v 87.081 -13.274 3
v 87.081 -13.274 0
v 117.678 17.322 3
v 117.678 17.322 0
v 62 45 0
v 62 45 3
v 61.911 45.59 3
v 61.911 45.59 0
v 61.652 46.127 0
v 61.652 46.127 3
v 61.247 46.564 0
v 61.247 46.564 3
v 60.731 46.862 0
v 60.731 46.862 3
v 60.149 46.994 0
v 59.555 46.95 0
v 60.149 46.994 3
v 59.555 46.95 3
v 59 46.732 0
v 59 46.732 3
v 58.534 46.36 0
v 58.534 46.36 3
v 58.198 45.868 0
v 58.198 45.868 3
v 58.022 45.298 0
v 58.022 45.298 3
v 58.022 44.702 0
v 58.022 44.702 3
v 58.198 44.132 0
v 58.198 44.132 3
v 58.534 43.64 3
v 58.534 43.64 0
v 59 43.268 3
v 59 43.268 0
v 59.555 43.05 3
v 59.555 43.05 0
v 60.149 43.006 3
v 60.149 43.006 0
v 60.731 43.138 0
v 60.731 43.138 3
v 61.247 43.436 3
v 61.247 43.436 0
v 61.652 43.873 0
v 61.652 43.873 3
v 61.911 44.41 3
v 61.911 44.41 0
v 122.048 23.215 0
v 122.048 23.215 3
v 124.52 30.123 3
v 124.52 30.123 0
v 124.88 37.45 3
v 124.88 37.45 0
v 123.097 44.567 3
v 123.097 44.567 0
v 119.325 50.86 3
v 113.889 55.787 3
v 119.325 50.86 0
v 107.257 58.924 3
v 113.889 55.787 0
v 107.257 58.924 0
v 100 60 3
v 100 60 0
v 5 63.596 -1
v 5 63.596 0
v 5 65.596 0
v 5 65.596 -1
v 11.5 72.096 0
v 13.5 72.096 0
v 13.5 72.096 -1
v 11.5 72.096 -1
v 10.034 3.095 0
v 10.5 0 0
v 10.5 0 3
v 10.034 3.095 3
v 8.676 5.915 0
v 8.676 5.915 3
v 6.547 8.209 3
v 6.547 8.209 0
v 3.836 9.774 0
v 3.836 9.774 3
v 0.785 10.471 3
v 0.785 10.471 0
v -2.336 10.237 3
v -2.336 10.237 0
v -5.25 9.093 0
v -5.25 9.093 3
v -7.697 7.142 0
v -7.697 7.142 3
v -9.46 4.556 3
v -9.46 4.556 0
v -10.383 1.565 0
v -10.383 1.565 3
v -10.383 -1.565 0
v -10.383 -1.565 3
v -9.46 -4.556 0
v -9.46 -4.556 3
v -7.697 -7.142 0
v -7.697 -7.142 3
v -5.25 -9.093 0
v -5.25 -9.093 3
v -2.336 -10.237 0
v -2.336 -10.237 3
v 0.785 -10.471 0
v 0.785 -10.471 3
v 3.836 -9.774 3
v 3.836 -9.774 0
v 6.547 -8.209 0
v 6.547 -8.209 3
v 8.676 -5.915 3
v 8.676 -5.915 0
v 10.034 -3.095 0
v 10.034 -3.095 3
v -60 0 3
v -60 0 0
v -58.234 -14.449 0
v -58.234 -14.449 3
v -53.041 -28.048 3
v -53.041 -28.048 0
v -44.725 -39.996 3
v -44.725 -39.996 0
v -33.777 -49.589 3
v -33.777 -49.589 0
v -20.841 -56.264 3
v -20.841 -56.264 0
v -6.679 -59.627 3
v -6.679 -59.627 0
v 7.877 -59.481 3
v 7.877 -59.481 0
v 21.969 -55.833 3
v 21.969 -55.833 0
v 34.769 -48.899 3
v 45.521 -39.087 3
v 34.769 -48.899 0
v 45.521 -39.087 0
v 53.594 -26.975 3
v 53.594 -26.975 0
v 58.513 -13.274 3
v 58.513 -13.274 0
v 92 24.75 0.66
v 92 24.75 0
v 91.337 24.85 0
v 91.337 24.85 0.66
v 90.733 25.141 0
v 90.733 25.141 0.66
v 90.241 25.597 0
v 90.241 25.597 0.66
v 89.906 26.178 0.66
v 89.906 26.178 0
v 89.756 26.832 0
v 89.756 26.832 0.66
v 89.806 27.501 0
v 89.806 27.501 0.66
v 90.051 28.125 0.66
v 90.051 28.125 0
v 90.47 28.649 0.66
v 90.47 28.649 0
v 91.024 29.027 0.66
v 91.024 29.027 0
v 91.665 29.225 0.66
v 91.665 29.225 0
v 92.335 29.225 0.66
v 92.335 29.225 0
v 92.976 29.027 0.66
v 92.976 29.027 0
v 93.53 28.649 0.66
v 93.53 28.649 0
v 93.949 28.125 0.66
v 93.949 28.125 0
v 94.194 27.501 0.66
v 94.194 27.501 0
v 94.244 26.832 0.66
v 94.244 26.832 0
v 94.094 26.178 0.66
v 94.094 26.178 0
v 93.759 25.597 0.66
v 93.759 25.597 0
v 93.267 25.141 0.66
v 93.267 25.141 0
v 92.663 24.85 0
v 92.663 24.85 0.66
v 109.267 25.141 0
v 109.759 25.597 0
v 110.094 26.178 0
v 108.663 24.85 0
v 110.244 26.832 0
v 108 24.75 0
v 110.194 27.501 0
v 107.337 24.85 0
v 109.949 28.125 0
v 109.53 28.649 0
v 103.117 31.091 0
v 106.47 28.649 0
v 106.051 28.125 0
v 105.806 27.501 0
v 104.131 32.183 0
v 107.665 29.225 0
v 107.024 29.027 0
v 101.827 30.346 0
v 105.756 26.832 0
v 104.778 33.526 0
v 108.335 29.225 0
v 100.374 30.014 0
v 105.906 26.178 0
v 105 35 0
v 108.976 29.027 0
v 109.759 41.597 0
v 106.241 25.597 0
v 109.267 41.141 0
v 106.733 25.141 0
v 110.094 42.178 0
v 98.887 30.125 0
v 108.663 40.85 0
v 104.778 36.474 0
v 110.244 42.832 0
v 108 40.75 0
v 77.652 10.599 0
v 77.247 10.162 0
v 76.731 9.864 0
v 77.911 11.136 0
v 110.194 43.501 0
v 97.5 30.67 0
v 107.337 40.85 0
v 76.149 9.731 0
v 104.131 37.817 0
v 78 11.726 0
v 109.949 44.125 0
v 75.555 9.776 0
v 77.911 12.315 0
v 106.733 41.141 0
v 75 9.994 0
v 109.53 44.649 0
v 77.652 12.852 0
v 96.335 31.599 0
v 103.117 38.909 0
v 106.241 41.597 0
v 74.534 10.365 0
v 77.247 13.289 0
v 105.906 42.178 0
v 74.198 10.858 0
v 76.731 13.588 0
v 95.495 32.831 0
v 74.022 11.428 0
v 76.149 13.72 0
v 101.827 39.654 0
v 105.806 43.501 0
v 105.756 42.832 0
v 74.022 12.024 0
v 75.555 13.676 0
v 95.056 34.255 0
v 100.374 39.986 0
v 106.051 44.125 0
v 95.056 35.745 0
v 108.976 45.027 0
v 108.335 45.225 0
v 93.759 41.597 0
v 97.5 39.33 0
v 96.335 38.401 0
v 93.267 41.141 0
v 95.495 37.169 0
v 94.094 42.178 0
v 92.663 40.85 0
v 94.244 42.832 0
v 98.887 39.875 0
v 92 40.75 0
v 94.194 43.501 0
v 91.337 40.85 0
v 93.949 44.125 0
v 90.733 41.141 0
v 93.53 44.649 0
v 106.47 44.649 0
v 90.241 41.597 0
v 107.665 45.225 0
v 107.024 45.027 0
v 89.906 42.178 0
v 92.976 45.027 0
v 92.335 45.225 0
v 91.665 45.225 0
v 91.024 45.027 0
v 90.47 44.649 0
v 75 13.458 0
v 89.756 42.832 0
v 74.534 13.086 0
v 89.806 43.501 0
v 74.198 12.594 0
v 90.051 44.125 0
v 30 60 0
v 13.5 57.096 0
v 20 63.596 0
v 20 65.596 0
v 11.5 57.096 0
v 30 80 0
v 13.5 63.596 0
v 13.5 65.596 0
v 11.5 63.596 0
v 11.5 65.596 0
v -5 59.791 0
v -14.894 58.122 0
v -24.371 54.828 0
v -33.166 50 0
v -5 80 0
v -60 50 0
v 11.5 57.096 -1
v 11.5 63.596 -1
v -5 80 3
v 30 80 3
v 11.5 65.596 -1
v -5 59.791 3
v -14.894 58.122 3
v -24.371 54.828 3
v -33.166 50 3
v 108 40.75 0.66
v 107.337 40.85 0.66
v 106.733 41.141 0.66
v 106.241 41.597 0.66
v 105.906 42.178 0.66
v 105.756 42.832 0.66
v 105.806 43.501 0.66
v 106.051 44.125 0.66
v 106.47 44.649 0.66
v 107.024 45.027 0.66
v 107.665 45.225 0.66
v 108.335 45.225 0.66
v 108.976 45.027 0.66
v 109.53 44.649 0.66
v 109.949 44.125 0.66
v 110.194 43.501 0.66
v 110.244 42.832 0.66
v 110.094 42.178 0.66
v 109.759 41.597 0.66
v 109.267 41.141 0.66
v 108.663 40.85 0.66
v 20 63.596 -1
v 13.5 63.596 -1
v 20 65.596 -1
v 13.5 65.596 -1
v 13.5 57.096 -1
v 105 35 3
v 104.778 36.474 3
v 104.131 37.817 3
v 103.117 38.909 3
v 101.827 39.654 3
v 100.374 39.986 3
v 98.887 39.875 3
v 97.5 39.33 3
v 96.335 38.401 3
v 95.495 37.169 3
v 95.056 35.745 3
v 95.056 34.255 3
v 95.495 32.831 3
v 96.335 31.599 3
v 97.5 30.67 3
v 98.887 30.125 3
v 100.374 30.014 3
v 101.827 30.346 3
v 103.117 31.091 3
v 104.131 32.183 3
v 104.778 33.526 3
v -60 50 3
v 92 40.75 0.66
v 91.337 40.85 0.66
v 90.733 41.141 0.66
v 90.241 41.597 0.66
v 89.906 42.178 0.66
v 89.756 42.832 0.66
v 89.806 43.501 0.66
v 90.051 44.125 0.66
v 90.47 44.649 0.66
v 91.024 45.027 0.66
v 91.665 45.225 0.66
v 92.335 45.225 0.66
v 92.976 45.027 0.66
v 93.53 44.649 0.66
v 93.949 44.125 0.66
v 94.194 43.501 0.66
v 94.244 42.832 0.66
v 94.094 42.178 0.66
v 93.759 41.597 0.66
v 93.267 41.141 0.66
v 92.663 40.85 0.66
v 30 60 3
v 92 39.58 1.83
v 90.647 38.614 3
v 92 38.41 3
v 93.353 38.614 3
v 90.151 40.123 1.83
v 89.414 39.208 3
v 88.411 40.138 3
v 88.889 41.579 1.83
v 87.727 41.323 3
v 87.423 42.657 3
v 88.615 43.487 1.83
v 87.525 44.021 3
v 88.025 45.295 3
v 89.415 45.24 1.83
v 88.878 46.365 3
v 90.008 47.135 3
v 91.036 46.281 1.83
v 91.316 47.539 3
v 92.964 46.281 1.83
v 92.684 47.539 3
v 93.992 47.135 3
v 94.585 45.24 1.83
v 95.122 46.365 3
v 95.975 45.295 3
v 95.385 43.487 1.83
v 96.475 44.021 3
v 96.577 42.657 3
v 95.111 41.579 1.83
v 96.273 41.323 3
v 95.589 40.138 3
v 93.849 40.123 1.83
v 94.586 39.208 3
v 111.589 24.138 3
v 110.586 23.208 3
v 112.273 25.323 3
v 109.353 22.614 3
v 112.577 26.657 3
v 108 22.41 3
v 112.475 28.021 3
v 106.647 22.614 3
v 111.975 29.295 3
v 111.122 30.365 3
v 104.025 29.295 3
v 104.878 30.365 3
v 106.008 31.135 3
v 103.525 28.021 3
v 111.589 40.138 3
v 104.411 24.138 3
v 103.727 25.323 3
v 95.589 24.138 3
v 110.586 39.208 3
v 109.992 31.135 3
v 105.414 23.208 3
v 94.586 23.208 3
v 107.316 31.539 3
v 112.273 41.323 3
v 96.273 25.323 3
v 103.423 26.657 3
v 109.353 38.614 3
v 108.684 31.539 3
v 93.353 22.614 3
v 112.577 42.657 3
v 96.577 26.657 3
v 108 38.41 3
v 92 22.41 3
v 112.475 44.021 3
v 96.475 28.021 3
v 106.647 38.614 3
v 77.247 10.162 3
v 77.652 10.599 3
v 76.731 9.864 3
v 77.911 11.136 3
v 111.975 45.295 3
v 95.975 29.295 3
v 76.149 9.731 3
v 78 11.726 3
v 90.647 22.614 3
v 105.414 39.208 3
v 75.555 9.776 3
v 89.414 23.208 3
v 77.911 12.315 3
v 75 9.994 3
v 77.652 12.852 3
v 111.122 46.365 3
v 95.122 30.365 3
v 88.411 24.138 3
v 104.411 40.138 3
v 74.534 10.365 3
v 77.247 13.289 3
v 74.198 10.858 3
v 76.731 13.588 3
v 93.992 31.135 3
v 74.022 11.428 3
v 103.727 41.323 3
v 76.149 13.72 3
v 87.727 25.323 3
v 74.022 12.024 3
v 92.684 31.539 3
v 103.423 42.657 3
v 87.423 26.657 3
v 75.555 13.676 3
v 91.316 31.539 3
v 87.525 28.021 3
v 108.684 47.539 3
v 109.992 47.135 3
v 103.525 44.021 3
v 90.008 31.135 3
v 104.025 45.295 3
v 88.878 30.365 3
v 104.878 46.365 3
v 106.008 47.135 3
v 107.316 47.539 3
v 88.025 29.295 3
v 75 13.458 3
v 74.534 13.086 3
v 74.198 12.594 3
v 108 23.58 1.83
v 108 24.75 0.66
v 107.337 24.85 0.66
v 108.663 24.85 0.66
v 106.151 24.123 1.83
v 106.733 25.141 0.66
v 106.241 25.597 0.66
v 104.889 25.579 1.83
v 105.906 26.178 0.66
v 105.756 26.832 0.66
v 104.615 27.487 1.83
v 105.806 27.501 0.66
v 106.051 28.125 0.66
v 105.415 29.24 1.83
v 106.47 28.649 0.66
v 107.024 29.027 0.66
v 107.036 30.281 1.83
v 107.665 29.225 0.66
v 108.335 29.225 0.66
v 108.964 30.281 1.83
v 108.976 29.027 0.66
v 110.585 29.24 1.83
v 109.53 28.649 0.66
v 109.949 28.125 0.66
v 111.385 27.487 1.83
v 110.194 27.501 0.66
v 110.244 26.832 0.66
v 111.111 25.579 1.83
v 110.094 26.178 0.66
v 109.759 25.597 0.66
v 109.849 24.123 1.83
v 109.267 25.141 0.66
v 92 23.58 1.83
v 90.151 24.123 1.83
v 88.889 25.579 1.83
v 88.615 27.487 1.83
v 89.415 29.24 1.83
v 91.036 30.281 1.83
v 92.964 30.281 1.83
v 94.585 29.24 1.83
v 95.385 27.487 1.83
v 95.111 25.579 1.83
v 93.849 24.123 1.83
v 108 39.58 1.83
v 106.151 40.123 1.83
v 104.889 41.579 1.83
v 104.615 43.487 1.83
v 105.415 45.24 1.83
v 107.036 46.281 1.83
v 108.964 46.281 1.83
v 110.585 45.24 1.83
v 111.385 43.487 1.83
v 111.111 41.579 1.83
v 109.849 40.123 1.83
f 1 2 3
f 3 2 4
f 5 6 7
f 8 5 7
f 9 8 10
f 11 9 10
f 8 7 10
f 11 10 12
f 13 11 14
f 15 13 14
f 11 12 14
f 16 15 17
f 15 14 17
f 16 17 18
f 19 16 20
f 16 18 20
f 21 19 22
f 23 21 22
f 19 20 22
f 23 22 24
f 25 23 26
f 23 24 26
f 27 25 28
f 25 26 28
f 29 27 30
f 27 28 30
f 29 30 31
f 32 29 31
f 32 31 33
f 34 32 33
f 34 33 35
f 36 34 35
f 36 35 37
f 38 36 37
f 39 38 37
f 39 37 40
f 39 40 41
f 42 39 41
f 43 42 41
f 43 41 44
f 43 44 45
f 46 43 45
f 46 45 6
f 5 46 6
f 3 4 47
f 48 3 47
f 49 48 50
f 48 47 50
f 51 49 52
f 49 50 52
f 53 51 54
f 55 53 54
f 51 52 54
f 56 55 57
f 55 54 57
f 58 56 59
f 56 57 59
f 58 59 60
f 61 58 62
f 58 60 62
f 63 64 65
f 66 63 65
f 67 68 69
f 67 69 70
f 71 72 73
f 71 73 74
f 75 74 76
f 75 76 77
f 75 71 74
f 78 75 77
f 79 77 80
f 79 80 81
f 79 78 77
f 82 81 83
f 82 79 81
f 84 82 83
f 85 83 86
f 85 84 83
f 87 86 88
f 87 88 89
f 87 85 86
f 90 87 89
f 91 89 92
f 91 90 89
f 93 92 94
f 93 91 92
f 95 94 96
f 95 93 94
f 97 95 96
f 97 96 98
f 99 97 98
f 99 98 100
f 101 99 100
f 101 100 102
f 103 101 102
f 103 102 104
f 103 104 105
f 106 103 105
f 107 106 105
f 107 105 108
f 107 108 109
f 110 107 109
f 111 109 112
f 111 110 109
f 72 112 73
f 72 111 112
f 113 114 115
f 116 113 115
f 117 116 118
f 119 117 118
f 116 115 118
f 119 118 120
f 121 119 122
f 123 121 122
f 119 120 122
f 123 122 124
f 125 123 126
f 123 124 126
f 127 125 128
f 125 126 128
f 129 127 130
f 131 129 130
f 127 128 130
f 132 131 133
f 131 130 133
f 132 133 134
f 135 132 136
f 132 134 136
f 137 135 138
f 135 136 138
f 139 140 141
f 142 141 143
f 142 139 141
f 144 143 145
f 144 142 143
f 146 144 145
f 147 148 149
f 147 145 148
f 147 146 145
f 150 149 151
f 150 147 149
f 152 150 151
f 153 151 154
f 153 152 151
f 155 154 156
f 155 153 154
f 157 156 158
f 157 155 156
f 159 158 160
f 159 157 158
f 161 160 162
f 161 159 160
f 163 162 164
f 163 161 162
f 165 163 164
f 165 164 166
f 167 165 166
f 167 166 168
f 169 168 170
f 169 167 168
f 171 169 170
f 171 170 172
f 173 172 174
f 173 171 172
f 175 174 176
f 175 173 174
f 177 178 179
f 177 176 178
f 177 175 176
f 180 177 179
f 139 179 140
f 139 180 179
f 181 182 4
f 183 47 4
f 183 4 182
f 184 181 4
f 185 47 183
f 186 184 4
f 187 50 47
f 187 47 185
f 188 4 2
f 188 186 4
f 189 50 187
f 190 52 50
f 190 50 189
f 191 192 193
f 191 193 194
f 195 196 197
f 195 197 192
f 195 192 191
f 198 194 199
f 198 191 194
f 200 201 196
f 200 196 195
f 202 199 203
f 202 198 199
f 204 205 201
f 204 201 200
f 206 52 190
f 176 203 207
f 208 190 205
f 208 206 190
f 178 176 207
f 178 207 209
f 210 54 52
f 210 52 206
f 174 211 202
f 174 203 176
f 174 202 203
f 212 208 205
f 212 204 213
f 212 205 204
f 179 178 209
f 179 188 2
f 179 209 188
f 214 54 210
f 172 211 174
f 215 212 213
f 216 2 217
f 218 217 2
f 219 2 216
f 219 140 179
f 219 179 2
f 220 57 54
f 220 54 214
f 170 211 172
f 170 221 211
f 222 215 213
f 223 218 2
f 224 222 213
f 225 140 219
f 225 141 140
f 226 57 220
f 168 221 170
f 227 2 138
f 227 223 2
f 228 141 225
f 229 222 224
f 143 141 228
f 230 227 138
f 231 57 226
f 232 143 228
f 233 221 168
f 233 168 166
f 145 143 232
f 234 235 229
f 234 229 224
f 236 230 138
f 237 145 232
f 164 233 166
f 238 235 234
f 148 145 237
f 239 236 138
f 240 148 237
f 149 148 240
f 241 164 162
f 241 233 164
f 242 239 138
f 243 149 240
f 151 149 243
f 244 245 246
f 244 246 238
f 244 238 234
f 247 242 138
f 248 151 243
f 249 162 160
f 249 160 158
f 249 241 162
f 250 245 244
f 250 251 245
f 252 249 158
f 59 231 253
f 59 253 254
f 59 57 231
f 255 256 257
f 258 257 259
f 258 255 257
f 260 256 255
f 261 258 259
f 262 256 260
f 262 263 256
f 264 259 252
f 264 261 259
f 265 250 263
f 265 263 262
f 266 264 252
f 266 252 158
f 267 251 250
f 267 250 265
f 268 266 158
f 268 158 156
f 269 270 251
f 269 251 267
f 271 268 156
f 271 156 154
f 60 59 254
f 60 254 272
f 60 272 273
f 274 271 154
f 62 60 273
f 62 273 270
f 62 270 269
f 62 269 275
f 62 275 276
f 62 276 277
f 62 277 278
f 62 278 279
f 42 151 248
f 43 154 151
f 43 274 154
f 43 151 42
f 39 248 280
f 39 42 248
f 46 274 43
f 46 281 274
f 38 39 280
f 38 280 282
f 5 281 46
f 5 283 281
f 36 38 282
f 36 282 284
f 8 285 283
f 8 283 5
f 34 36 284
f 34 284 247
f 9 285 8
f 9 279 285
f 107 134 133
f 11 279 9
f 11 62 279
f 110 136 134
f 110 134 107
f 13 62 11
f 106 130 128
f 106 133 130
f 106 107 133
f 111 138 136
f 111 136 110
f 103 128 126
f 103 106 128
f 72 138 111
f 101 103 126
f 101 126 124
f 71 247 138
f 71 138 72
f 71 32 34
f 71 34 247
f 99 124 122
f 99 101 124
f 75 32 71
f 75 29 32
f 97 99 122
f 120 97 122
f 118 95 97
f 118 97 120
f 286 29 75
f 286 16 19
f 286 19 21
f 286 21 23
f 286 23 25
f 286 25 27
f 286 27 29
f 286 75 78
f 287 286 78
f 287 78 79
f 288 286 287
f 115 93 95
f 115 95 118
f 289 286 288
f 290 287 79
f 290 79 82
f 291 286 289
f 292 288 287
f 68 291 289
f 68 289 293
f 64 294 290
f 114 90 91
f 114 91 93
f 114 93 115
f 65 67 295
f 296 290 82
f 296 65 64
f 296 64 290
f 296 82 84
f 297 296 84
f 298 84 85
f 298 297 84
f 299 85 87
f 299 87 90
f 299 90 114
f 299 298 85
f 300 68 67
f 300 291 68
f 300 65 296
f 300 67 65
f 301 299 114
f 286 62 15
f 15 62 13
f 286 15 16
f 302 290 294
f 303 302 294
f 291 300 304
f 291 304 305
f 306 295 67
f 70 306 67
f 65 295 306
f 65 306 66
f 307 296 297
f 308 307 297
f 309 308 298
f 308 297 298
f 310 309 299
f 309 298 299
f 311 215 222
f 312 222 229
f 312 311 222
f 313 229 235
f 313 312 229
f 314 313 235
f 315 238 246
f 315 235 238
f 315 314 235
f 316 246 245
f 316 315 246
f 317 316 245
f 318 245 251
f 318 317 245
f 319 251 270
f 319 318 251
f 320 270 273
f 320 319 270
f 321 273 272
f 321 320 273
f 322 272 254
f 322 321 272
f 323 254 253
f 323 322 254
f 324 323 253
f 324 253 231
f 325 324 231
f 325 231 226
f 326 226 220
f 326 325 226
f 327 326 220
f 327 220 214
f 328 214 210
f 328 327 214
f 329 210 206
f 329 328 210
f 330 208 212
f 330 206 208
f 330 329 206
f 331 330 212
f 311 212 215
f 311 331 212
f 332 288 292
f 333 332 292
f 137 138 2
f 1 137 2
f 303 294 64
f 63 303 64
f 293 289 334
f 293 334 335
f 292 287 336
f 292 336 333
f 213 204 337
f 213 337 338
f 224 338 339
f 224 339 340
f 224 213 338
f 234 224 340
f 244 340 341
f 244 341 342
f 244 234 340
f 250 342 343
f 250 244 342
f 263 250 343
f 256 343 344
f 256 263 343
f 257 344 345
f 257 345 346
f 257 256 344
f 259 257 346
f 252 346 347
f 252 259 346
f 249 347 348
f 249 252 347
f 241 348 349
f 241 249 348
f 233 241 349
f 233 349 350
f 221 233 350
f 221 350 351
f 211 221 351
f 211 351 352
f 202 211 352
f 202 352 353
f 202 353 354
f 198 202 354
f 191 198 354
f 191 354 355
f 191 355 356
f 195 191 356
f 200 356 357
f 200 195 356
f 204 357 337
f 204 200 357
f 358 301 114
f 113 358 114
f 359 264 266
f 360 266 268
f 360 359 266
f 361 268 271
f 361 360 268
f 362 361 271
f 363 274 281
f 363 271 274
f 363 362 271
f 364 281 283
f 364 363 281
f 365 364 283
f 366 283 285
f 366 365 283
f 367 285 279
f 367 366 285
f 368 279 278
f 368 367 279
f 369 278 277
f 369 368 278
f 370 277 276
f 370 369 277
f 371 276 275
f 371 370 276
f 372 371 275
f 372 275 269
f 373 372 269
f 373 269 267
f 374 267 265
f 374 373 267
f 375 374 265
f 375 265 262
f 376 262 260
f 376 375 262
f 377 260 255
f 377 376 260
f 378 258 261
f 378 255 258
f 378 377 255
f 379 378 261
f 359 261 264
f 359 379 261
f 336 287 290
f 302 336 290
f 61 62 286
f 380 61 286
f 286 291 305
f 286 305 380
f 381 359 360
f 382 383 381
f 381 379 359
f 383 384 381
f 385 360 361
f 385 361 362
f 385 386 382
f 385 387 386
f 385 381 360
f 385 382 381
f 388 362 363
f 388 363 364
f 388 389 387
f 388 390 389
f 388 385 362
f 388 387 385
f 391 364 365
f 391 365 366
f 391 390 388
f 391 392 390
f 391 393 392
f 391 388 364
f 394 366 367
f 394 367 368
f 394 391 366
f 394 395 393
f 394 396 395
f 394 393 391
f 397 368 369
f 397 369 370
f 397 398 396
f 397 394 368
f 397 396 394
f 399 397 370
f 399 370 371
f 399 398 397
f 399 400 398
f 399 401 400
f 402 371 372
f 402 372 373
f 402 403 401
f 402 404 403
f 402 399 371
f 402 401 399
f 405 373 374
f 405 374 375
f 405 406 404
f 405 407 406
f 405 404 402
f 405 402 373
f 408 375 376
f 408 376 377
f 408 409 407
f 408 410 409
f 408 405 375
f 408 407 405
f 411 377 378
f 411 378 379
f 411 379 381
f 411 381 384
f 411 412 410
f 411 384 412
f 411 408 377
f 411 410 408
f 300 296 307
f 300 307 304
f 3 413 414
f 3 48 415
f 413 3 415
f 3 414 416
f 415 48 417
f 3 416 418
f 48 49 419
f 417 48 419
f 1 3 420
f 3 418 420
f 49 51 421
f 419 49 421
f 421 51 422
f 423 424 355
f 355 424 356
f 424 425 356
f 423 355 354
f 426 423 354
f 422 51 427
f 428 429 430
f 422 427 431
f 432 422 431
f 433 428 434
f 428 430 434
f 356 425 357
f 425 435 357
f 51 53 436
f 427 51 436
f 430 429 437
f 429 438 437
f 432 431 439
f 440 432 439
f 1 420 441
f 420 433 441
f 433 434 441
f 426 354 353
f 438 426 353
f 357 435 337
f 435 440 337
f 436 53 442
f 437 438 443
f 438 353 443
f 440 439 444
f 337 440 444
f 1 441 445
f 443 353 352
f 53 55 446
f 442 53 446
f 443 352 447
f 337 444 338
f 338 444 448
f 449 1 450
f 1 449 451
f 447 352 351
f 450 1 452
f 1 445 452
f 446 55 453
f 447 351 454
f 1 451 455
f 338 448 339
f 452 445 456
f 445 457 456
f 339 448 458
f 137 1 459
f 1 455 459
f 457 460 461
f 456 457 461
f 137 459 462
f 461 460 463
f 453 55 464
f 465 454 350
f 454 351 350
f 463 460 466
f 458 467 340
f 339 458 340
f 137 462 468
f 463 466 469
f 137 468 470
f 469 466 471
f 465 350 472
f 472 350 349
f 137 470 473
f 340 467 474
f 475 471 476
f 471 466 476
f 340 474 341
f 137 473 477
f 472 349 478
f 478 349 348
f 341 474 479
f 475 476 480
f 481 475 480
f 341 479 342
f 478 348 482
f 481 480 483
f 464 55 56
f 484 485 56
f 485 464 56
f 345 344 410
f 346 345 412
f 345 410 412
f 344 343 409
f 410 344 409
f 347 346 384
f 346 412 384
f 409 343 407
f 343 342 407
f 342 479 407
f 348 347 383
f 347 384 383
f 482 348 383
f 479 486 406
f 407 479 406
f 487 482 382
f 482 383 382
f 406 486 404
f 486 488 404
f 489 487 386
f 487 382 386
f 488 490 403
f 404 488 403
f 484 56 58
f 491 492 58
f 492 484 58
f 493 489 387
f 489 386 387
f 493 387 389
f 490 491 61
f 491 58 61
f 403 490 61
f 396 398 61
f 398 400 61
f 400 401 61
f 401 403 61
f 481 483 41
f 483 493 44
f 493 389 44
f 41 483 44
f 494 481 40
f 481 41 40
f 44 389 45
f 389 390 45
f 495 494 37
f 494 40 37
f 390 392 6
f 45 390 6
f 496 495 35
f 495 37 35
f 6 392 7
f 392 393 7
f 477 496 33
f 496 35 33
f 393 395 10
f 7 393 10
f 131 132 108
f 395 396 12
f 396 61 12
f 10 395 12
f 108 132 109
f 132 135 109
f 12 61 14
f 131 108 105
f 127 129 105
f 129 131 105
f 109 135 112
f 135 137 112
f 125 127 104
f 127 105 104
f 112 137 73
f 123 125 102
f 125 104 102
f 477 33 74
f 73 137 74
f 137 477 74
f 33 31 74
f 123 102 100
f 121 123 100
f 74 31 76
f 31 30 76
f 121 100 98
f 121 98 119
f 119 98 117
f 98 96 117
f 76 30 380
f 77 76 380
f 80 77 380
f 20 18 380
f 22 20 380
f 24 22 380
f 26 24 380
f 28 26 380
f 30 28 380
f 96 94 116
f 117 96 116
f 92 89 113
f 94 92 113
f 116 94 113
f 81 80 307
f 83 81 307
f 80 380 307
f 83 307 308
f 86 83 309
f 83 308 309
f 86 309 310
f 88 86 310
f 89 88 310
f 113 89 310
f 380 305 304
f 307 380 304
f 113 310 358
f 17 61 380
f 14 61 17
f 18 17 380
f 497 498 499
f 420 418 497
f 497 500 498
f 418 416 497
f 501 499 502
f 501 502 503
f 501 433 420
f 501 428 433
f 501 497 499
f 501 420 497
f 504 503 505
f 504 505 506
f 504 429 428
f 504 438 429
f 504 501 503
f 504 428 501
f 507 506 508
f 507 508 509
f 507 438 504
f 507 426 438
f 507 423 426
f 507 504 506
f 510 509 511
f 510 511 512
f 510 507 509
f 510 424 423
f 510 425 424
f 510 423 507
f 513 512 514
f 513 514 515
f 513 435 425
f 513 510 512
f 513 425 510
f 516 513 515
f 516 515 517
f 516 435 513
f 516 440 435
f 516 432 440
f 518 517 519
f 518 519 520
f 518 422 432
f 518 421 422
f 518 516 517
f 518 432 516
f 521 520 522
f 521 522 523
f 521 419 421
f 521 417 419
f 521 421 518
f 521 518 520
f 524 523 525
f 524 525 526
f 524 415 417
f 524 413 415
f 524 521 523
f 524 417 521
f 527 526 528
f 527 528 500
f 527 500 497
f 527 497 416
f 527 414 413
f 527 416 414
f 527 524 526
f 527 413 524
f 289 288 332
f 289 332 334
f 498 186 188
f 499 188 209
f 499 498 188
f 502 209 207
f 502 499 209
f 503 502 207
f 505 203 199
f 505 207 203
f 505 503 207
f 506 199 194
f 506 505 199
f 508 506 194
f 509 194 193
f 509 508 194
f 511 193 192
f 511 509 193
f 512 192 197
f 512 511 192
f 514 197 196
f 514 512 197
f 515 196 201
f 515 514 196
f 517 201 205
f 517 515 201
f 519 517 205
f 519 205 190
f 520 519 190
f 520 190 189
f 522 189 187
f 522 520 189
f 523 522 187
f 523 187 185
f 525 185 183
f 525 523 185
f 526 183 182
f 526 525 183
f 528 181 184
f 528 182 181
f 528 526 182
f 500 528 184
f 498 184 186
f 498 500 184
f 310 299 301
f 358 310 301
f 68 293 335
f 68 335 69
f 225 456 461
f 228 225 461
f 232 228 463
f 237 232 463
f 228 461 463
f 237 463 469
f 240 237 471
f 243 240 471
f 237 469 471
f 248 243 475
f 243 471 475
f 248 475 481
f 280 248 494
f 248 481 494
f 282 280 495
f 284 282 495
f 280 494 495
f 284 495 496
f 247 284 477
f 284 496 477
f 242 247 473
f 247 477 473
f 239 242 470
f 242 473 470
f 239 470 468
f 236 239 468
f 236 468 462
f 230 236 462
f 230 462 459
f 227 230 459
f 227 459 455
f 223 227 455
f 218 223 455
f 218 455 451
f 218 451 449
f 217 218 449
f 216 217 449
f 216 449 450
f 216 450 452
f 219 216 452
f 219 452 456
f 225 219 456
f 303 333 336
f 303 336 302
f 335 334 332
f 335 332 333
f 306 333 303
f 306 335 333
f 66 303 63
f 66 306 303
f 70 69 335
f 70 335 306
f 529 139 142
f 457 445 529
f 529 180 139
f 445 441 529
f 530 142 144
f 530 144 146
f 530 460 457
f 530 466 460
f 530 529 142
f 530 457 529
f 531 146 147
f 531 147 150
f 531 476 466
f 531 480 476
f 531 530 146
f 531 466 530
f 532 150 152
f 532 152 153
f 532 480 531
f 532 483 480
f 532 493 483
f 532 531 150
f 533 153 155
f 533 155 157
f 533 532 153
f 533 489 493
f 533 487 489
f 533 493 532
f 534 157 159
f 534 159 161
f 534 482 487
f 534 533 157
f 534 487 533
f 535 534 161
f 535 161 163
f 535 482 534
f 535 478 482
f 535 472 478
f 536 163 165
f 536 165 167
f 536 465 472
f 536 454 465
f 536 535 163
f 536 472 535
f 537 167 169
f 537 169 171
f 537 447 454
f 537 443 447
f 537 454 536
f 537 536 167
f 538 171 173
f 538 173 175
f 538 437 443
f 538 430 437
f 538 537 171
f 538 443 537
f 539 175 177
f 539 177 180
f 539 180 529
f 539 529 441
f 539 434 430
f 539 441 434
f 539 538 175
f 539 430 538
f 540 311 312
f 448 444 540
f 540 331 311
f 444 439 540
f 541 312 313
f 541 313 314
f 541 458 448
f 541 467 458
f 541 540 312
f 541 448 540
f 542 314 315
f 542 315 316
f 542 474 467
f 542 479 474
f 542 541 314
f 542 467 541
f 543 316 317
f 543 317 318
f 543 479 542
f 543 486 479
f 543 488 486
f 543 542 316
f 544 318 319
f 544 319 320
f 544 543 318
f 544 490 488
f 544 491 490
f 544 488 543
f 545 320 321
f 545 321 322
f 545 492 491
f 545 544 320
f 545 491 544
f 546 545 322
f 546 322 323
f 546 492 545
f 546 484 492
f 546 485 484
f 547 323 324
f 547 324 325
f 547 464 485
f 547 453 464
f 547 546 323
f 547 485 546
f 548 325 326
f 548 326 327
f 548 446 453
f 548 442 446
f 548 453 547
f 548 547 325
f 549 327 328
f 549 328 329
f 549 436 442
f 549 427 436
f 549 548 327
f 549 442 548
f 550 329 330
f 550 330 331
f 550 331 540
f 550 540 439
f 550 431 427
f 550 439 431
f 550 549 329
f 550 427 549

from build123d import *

# Parameters (mm, degrees)
SKETCH1_R                                    = 10.5
SKETCH1_R_2                                  = 5
BOSS_EXTRUDE1_DEPTH                          = 3
CUT_EXTRUDE1_REACH                           = 140.687
SKETCH2_R                                    = 2
BOSS_EXTRUDE2_DEPTH                          = 3
SKETCH4_W                                    = 2
SKETCH4_H                                    = 6.5
SKETCH4_W_2                                  = 6.5
SKETCH4_H_2                                  = 2
BOSS_EXTRUDE3_DEPTH                          = 1
SKETCH5_R                                    = 2
CUT_EXTRUDE2_DEPTH                           = 10
CSK_FOR_M4_HEX_SOCKET_COUNTERSUNK_HE_2_COUNT = 2
CSK_FOR_M4_HEX_SOCKET_COUNTERSUNK_HE_2_PITCH = 16
CSK_FOR_M4_HEX_SOCKET_COUNTERSUNK_HE_3_COUNT = 2
CSK_FOR_M4_HEX_SOCKET_COUNTERSUNK_HE_3_PITCH = 16
CSK_FOR_M4_HEX_SOCKET_COUNTERSUNK_HE_4_COUNT = 2
CSK_FOR_M4_HEX_SOCKET_COUNTERSUNK_HE_4_PITCH = 22.627416998


with BuildPart() as part:
    # Sketch1 → Boss-Extrude1 (new body)
    # profile 1 of 2: a face of its own
    with BuildSketch(Plane.XY):
        with BuildLine():
            ThreePointArc((-60, 0), (-52.867640737, 28.372743309), (-33.166247904, 50))
            Line((-33.166247904, 50), (-60, 50))
            Line((-60, 50), (-60, 0))
        make_face()
    # profile 2 of 2: a face of its own
    with BuildSketch(Plane.XY):
        with BuildLine():
            ThreePointArc((0, 60), (-17.320508076, 57.445626465), (-33.166247904, 50))
            ThreePointArc((-33.166247904, 50), (-52.867640737, 28.372743309), (-60, 0))
            ThreePointArc((-60, 0), (-6.678621673, -59.627141576), (58.513200418, -13.274237334))
            Line((58.513200418, -13.274237334), (87.081101726, -13.274237334))
            Line((87.081101726, -13.274237334), (117.67766953, 17.32233047))
            ThreePointArc((117.67766953, 17.32233047), (123.096988313, 44.567085809), (100, 60))
            Line((100, 60), (0, 60))
        make_face()
        Circle(SKETCH1_R, mode=Mode.SUBTRACT)
        with Locations((100, 35)):
            Circle(SKETCH1_R_2, mode=Mode.SUBTRACT)
    extrude(amount=BOSS_EXTRUDE1_DEPTH)

    # Sketch2 → Cut-Extrude1 (cut, up to next)
    with BuildSketch(Plane.XY.offset(3), mode=Mode.PRIVATE) as cut_extrude1_sk1:
        with Locations((60, 45)):
            Circle(SKETCH2_R)
    cut_extrude1_tool1 = extrude(cut_extrude1_sk1.sketch, amount=-CUT_EXTRUDE1_REACH, mode=Mode.PRIVATE) & part.part
    # Sketch2 → Cut-Extrude1 (cut, up to next)
    with BuildSketch(Plane.XY.offset(3), mode=Mode.PRIVATE) as cut_extrude1_sk2:
        with Locations((76, 11.725762666)):
            Circle(SKETCH2_R)
    cut_extrude1_tool2 = extrude(cut_extrude1_sk2.sketch, amount=-CUT_EXTRUDE1_REACH, mode=Mode.PRIVATE) & part.part
    add(cut_extrude1_tool1.solids().sort_by_distance((60, 45, 3))[0], mode=Mode.SUBTRACT)
    add(cut_extrude1_tool2.solids().sort_by_distance((76, 11.725763, 3))[0], mode=Mode.SUBTRACT)

    # Sketch3 → Boss-Extrude2 (add)
    with BuildSketch(Plane(origin=(0, 0, 0), x_dir=(-1, 0, 0), z_dir=(0, 0, -1))):
        with BuildLine():
            Line((-30, 80), (-30, 60))
            Line((-30, 60), (0, 60))
            ThreePointArc((0, 60), (2.502176759, 59.947803225), (5, 59.791303716))
            Line((5, 59.791303716), (5, 80))
            Line((5, 80), (-30, 80))
        make_face()
    extrude(amount=-BOSS_EXTRUDE2_DEPTH)

    # Sketch4 → Boss-Extrude3 (add)
    with BuildSketch(Plane(origin=(0, 0, 0), x_dir=(-1, 0, 0), z_dir=(0, 0, -1))):
        with Locations((-12.5, 68.846087829)):
            Rectangle(SKETCH4_W, SKETCH4_H)
        with Locations((-16.75, 64.596087829)):
            Rectangle(SKETCH4_W_2, SKETCH4_H_2)
        with Locations((-12.5, 64.596087829)):
            Rectangle(SKETCH4_W, SKETCH4_H_2)
        with Locations((-8.25, 64.596087829)):
            Rectangle(SKETCH4_W_2, SKETCH4_H_2)
        with Locations((-12.5, 60.346087829)):
            Rectangle(SKETCH4_W, SKETCH4_H)
    extrude(amount=BOSS_EXTRUDE3_DEPTH)

    # Sketch5 → Cut-Extrude2 (cut)
    with BuildSketch(Plane.XY.offset(3)):
        with Locations((92, 43)):
            Circle(SKETCH5_R)
        with Locations((108, 43)):
            Circle(SKETCH5_R)
        with Locations((108, 27)):
            Circle(SKETCH5_R)
        with Locations((92, 27)):
            Circle(SKETCH5_R)
    extrude(amount=-CUT_EXTRUDE2_DEPTH, mode=Mode.SUBTRACT)

    # Sketch8 → CSK for M4 Hex Socket Countersunk Head Screw1 (revolve, cut)
    with BuildSketch(Plane(origin=(92, 43, 3), x_dir=(0, -1, 0), z_dir=(1, 0, 0))):
        Polygon((0, 0), (0, 4), (2.25, 4), (2.25, 2.34), (4.59, 0), align=None)
    csk_for_m4_hex_socket_countersunk_head_s = revolve(axis=Axis((92, 43, 9.35), (0, 0, -1)), mode=Mode.SUBTRACT)

    # CSK for M4 Hex Socket Countersunk He 2: CSK for M4 Hex Socket Countersunk Head Screw1 ×2
    with Locations(*[(i * CSK_FOR_M4_HEX_SOCKET_COUNTERSUNK_HE_2_PITCH, 0, 0) for i in range(1, CSK_FOR_M4_HEX_SOCKET_COUNTERSUNK_HE_2_COUNT)]):
        add(csk_for_m4_hex_socket_countersunk_head_s, mode=Mode.SUBTRACT)

    # CSK for M4 Hex Socket Countersunk He 3: CSK for M4 Hex Socket Countersunk Head Screw1 ×2
    with Locations(*[(0, -i * CSK_FOR_M4_HEX_SOCKET_COUNTERSUNK_HE_3_PITCH, 0) for i in range(1, CSK_FOR_M4_HEX_SOCKET_COUNTERSUNK_HE_3_COUNT)]):
        add(csk_for_m4_hex_socket_countersunk_head_s, mode=Mode.SUBTRACT)

    # CSK for M4 Hex Socket Countersunk He 4: CSK for M4 Hex Socket Countersunk Head Screw1 ×2
    with Locations(*[Vector(0.7071067811865472, -0.7071067811865478, 0) * (i * CSK_FOR_M4_HEX_SOCKET_COUNTERSUNK_HE_4_PITCH) for i in range(1, CSK_FOR_M4_HEX_SOCKET_COUNTERSUNK_HE_4_COUNT)]):
        add(csk_for_m4_hex_socket_countersunk_head_s, mode=Mode.SUBTRACT)


solid = part.part
